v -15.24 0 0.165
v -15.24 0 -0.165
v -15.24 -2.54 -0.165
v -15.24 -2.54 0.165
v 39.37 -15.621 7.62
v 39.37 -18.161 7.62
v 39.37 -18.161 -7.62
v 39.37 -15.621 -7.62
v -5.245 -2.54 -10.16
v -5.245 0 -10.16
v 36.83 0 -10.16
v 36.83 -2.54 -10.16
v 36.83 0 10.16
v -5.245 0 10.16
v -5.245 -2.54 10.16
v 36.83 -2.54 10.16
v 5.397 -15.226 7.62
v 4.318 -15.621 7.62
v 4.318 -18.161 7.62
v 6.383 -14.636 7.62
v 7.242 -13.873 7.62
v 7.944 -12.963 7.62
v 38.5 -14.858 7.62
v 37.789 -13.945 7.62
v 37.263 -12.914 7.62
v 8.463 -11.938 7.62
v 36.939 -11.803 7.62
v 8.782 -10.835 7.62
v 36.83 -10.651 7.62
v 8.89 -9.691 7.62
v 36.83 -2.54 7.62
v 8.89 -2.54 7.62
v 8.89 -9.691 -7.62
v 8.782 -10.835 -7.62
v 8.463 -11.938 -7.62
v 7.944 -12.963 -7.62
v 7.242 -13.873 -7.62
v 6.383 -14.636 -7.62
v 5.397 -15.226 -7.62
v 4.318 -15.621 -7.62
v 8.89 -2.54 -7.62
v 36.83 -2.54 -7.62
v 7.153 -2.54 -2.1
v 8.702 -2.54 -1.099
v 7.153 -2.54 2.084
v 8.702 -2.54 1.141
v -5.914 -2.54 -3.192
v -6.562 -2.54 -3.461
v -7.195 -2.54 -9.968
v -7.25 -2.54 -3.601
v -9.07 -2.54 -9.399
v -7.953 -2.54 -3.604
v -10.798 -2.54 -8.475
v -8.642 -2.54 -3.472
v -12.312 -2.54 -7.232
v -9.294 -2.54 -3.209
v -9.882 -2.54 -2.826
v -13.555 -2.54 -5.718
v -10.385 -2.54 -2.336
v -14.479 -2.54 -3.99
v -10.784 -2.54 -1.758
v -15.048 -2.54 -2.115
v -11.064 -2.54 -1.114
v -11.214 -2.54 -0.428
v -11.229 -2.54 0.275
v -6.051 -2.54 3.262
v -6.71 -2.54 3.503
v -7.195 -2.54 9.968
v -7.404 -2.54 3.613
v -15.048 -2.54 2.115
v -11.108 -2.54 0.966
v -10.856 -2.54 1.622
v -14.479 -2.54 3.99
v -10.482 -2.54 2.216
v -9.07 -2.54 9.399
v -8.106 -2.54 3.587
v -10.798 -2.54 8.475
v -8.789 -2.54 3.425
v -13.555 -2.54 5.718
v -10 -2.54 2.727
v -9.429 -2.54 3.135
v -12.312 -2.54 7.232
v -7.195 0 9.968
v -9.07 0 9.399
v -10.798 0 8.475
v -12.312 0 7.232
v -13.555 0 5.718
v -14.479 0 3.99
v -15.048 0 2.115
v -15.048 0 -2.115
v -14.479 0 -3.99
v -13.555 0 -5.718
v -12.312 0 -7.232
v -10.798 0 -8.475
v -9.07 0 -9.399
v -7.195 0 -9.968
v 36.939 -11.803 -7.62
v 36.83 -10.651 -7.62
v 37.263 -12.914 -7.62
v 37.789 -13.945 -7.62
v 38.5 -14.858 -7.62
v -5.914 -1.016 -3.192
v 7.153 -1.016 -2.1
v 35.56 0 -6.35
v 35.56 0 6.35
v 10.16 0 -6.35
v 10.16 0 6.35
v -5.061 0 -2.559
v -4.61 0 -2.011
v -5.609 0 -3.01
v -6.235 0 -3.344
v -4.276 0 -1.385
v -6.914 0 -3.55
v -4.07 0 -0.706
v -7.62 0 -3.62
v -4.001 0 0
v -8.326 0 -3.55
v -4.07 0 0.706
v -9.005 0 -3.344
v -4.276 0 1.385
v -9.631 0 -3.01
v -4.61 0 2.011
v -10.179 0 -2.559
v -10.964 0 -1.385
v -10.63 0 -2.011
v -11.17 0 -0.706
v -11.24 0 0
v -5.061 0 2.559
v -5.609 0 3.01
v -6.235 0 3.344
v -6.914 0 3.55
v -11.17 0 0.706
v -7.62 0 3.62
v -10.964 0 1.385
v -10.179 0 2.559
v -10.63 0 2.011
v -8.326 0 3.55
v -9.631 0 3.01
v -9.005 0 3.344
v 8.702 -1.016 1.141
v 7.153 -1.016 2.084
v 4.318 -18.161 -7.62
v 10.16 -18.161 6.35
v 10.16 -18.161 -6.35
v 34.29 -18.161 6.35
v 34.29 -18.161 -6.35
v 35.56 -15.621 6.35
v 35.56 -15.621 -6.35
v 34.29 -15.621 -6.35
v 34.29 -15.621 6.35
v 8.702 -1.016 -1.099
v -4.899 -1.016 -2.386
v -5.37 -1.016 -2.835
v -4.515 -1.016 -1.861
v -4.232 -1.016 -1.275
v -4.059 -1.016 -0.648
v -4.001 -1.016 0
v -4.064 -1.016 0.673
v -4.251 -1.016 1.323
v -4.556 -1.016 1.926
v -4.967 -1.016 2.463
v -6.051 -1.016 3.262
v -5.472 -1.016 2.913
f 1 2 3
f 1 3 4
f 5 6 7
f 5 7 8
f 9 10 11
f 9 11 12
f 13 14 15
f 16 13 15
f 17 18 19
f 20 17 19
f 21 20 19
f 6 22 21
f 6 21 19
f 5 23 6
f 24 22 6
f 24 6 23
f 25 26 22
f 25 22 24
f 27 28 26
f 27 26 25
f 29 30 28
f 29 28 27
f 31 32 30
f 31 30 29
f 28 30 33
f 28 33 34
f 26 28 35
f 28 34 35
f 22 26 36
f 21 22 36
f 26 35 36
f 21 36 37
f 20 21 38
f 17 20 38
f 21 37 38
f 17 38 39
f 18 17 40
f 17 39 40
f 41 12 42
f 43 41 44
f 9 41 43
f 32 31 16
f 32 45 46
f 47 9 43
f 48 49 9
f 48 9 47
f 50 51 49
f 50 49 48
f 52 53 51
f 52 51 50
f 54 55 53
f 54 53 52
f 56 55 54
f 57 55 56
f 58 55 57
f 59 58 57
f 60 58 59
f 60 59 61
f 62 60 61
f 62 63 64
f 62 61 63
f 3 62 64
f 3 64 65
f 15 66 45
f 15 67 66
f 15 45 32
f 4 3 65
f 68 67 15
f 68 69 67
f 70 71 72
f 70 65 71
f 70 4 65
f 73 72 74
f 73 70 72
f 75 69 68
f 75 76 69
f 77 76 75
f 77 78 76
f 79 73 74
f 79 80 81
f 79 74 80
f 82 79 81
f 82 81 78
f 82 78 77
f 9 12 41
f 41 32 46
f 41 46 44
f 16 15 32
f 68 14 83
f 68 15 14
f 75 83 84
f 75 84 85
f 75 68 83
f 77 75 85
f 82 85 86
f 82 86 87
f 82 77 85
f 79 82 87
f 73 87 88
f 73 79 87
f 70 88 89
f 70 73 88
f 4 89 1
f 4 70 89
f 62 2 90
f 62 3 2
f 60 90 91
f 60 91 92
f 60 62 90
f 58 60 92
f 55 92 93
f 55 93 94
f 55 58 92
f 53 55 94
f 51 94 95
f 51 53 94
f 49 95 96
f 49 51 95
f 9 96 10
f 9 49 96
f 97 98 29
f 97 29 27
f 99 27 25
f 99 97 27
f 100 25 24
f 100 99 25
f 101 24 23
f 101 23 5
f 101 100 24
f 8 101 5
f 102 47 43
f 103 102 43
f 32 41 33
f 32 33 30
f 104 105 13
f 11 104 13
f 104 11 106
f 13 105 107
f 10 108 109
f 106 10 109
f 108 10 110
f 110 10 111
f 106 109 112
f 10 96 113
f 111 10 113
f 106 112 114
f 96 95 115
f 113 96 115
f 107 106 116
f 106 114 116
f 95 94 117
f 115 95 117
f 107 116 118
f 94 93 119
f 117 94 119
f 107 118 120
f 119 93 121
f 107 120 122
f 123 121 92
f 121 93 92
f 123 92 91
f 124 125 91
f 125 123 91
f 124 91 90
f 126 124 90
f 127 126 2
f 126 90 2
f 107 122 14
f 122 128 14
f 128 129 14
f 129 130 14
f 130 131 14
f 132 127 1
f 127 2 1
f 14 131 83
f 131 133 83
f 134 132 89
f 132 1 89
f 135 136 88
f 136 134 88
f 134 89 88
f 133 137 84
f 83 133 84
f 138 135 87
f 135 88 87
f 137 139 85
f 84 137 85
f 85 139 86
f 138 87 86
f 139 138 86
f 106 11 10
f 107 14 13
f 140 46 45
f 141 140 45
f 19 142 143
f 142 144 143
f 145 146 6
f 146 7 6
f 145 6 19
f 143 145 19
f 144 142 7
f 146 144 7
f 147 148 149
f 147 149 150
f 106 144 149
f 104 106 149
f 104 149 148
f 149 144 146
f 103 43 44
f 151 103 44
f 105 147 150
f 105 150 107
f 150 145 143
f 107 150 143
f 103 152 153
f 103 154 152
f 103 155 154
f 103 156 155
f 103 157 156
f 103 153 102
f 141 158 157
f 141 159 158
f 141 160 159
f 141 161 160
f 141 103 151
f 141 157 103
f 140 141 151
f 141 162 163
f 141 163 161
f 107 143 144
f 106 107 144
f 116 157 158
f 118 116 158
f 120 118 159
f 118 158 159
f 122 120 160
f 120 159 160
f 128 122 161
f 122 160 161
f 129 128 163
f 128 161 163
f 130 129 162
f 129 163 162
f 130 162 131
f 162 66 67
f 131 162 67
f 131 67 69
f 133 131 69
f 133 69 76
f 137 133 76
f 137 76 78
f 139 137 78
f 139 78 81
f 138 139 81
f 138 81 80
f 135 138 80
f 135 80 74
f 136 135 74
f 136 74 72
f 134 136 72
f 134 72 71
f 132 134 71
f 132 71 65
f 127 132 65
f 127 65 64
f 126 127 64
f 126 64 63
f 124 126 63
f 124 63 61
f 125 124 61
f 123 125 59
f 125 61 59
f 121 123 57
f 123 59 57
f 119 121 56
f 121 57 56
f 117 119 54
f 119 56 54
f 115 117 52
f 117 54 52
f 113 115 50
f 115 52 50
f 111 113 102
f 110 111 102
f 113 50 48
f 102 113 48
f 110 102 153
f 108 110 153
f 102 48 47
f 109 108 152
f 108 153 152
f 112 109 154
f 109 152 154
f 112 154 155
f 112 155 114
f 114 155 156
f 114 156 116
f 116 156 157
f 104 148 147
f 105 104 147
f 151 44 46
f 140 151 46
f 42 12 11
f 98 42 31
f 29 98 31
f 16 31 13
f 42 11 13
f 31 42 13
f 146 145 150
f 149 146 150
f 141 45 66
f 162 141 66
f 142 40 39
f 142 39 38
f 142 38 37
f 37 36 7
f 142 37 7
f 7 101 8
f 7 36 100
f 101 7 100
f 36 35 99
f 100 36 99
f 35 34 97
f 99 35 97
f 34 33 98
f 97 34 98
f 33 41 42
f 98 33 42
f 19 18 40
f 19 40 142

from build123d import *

# Parameters (mm, degrees)
F0_W         = 30.48
F0_H         = 20.32
F1_DEPTH     = 2.54
F2_R         = 3.6195
F4_DEPTH     = 25.4
F5_DEPTH     = 1.524
F6_DEPTH     = 21.59
F7_W         = 27.94
F7_H         = 15.24
F8_DEPTH     = 15.621
F10_DEPTH    = 25.4
F11_W        = 2.54
F11_H        = 15.24
F12_DEPTH    = 4.572
F13_W        = 2.54
F13_H        = 15.24
F14_DEPTH    = 2.54
F15_R        = 9.9953269909
F16_T1_DEPTH = 15.24


# Not quite as in the source:
# - a fillet or chamfer that OpenCascade refuses, or shapes differently, is made with other operations: its cross-section is extruded or revolved along the edge and cut away or added


with BuildPart() as f1:
    # F0 (on Front) → F1 (new body)
    with BuildSketch(Plane.XZ):
        Rectangle(F0_W, F0_H)
    extrude(amount=F1_DEPTH)

    # F2 (on face) → F4 (cut)
    with BuildSketch(Plane.XZ.offset(2.54)):
        with Locations((-7.62, 0)):
            Circle(F2_R)
    extrude(amount=-F4_DEPTH, mode=Mode.SUBTRACT)

    # F3 (on face) → F5 (cut)
    with BuildSketch(Plane.XZ.offset(2.54)):
        Polygon((7.1528805111, 2.0839335623), (-6.0890655676, 3.2650576724), (-5.9136119671, -3.1920422334), (7.1528805111, -2.0996773468), (8.7022805111, -1.0994056345), (8.7022805111, 1.1413069921), align=None)
    extrude(amount=-F5_DEPTH, mode=Mode.SUBTRACT)

    # F6 (add): a face of the model
    f6_faces = [f1.faces().sort_by_distance(p)[0] for p in [
        (15.24, -1.27, 0),
    ]]
    extrude(f6_faces, amount=F6_DEPTH)

    # F7 (on face) → F8 (join)
    with BuildSketch(Plane.XZ.offset(2.54)):
        with Locations((22.86, 0)):
            Rectangle(F7_W, F7_H)
    extrude(amount=F8_DEPTH)

    # F9 (on face) → F10 (cut)
    with BuildSketch(Plane.XZ.offset(18.161)):
        Polygon((10.16, 6.35), (10.16, -6.35), (35.56, -6.35), (35.56, 0), (35.56, 6.35), align=None)
    extrude(amount=-F10_DEPTH, mode=Mode.SUBTRACT)

    # F11 (on face) → F12 (join)
    with BuildSketch(Plane(origin=(8.89, 0, 0), x_dir=(0, -1, 0), z_dir=(-1, 0, 0))):
        with Locations((16.891, 0)):
            Rectangle(F11_W, F11_H)
    extrude(amount=F12_DEPTH)

    # F13 (on face) → F14 (join, symmetric)
    with BuildSketch(Plane.YZ.offset(36.83)):
        with Locations((-16.891, 0)):
            Rectangle(F13_W, F13_H)
    extrude(amount=F14_DEPTH, both=True)

    # F15
    f15_edges = [f1.edges().sort_by_distance(p)[0] for p in [
        (-15.24, -1.27, 10.16),
        (-15.24, -1.27, -10.16),
    ]]
    fillet(f15_edges, radius=F15_R)

    # F16: fillet of radius 6.1321024484 on 2 edges, made by hand

    # F16_s2 → F16_t1 (join)
    with BuildSketch(Plane.XY.offset(-7.62)):
        with BuildLine():
            ThreePointArc((8.89, -9.6906744787), (7.6143050963, -13.4347346007), (4.318, -15.621))
            Line((4.318, -15.621), (8.89, -15.621))
            Line((8.89, -15.621), (8.89, -9.6906744787))
        make_face()
        with BuildLine():
            ThreePointArc((36.83, -10.6511428151), (37.5017993132, -13.4418004633), (39.37, -15.621))
            Line((39.37, -15.621), (36.83, -15.621))
            Line((36.83, -15.621), (36.83, -10.6511428151))
        make_face()
    extrude(amount=F16_T1_DEPTH)


solid = f1.part
